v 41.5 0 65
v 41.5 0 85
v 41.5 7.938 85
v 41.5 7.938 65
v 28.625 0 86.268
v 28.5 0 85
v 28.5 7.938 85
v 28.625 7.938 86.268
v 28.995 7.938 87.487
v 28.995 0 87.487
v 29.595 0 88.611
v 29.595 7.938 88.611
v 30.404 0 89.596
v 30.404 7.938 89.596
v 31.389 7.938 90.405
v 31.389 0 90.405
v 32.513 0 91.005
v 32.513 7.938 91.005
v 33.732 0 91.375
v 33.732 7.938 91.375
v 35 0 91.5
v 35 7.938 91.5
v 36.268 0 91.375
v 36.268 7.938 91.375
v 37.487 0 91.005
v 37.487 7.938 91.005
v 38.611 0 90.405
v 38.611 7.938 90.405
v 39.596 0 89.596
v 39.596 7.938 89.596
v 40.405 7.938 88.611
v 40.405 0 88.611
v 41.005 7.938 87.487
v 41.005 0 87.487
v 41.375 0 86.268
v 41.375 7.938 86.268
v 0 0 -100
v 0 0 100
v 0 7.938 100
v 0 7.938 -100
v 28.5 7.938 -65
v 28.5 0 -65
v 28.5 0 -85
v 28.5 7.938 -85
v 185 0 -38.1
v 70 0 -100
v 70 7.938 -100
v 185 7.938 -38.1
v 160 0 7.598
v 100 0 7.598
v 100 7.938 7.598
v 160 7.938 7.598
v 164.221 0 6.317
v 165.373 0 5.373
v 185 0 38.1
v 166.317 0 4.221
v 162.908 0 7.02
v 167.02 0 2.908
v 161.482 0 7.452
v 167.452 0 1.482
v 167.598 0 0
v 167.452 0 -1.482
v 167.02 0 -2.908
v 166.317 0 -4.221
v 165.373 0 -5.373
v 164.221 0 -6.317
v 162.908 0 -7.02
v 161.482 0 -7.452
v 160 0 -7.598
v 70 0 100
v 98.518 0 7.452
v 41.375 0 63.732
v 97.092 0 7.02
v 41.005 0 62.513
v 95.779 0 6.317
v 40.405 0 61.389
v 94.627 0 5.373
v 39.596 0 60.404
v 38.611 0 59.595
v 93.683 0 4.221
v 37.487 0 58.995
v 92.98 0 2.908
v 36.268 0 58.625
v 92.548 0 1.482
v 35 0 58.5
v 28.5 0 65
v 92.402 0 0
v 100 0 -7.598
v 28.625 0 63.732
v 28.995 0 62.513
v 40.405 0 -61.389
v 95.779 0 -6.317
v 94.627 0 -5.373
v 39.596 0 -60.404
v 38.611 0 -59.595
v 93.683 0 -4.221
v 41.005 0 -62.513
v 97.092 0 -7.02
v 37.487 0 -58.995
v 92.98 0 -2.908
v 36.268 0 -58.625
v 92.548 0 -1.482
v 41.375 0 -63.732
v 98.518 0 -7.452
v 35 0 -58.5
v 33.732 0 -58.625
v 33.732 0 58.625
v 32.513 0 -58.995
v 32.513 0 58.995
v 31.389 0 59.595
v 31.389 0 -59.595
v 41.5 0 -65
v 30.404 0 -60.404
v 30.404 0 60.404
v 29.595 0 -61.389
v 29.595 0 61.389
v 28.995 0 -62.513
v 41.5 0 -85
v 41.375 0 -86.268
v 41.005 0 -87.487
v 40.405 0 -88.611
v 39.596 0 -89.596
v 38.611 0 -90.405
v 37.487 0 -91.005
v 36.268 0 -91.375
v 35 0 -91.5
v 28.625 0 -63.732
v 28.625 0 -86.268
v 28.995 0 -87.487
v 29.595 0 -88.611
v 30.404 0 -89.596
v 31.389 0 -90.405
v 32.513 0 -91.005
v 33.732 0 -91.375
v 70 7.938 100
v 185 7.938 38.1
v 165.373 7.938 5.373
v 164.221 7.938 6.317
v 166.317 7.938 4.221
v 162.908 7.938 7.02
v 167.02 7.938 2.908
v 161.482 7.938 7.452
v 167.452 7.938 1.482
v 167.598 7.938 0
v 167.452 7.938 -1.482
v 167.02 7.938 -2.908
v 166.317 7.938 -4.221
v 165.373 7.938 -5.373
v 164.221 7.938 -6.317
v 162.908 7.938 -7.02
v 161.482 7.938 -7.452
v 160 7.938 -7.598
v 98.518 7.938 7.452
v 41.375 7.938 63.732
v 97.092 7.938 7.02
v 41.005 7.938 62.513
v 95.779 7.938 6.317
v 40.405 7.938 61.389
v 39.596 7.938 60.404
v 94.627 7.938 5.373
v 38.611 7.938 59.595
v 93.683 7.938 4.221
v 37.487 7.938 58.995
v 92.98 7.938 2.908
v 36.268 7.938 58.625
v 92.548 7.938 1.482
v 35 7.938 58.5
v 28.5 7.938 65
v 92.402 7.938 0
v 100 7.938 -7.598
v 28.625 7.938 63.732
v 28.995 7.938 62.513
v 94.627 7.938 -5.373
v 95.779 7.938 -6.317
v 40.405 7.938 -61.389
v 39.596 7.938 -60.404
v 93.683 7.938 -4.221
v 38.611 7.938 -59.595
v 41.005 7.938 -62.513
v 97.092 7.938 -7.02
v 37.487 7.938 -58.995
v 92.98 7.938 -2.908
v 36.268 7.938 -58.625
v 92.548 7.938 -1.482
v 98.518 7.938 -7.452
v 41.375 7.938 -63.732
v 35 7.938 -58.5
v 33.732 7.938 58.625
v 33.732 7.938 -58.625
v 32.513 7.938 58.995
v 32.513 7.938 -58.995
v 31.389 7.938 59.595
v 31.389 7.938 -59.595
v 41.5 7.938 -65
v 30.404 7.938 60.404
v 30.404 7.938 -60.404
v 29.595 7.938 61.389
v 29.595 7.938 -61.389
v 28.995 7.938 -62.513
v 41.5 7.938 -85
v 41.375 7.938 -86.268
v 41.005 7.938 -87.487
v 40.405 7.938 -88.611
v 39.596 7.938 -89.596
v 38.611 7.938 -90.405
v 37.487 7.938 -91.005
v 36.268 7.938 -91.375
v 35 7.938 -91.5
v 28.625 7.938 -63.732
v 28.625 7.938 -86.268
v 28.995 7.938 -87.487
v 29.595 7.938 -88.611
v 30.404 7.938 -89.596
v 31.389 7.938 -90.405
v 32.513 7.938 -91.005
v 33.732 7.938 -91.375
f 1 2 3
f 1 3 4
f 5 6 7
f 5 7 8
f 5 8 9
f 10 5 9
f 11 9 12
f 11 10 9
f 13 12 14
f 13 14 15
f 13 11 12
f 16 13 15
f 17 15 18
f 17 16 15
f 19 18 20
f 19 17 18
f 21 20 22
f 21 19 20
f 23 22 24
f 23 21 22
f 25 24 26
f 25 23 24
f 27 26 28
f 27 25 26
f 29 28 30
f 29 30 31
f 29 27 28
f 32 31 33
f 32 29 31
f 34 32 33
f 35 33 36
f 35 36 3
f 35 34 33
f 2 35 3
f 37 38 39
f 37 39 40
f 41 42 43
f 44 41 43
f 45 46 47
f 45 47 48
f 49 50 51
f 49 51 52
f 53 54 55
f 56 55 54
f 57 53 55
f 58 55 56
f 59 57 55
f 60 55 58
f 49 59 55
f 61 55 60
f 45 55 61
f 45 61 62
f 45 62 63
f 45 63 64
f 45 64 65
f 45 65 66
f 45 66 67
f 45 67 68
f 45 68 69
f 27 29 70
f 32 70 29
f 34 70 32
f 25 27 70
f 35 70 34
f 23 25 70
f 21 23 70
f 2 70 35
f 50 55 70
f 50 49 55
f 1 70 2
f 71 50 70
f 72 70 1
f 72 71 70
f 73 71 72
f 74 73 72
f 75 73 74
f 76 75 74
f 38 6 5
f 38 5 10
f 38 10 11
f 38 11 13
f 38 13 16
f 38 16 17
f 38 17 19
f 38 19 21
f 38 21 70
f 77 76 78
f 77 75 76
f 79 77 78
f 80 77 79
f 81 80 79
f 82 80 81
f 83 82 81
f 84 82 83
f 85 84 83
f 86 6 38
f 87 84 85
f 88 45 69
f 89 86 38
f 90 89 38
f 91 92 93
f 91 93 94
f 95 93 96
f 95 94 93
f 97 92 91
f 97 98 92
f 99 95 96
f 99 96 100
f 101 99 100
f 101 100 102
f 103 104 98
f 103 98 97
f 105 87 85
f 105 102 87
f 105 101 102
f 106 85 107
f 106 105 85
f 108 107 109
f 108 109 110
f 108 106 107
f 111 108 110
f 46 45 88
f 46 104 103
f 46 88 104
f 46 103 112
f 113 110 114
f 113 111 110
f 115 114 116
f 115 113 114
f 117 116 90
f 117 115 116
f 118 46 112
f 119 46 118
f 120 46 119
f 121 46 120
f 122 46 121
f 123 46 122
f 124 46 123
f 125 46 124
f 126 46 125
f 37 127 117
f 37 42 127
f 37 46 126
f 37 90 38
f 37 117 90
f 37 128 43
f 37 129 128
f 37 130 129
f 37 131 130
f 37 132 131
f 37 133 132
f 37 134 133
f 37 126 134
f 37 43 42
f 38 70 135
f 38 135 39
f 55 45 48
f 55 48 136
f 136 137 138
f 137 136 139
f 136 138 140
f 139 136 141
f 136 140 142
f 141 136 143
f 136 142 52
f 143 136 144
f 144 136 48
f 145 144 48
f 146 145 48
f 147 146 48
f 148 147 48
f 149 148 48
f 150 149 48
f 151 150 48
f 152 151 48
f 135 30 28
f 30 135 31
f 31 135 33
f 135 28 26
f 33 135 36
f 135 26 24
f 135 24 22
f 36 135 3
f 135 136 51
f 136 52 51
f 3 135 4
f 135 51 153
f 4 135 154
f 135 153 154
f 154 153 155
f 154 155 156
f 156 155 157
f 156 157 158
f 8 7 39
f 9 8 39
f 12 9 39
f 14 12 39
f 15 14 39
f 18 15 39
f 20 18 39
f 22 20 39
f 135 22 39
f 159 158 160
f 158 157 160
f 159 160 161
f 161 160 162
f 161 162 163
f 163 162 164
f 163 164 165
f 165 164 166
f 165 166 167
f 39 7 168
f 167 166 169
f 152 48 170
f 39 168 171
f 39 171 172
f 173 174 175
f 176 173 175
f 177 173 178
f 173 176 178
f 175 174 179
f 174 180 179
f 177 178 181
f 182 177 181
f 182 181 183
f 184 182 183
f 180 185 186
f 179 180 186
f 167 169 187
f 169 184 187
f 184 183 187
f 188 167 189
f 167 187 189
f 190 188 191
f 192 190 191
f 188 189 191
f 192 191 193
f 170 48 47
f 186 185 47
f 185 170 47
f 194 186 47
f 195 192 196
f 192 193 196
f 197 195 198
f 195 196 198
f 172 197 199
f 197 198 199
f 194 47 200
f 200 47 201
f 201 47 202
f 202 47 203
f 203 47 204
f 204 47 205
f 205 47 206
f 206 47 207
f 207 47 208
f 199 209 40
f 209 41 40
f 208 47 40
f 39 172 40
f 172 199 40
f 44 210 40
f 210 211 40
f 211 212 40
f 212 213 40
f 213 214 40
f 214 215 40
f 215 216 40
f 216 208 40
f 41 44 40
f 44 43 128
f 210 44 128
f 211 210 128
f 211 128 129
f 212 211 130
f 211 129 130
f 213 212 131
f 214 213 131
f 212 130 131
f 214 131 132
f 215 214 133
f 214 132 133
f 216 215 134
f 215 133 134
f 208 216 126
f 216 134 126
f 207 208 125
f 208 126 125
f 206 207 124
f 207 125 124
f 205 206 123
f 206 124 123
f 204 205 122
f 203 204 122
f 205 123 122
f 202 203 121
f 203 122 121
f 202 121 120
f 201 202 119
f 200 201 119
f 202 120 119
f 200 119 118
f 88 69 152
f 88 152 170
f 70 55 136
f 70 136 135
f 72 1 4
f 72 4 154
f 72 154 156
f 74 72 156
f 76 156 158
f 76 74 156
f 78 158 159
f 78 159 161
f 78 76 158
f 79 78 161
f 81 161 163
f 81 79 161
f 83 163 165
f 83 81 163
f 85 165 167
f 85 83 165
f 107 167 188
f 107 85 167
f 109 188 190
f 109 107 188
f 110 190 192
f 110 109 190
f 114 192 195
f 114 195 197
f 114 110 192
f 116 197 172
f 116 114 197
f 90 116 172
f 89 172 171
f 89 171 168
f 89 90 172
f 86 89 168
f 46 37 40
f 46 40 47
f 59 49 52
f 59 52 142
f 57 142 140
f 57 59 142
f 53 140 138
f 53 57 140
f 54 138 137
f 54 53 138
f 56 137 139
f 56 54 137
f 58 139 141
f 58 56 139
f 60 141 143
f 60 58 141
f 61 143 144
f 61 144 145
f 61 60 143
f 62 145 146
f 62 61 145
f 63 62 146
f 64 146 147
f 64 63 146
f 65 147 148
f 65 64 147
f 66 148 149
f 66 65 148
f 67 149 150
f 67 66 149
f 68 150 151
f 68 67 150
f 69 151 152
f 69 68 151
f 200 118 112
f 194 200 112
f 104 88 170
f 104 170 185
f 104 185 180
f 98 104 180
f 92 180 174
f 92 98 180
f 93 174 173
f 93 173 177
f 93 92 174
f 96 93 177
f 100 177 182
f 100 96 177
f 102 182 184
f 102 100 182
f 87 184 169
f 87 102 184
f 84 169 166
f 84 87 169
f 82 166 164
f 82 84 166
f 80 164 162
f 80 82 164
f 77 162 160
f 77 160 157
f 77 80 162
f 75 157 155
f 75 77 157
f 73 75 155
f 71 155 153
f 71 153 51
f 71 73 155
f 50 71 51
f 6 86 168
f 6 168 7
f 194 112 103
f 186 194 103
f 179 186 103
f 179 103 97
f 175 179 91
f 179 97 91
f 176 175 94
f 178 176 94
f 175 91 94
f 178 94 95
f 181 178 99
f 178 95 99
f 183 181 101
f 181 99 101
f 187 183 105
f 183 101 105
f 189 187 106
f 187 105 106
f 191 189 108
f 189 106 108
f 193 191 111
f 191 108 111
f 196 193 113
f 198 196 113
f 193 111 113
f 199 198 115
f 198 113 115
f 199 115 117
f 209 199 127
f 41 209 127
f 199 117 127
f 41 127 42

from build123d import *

# Parameters (mm, degrees)
SALIENTE_EXTRUIR1_DEPTH = 7.9375


with BuildPart() as part:
    # Croquis1 → Saliente-Extruir1 (new body)
    with BuildSketch(Plane(origin=(0, 0, 0), x_dir=(1, 0, 0), z_dir=(0, 1, 0))):
        Polygon((70, -100), (0, -100), (0, 100), (70, 100), (185, 38.1), (185, -38.1), align=None)
        with BuildLine():
            ThreePointArc((41.5, -65), (35, -58.5), (28.5, -65))
            Line((28.5, -65), (28.5, -85))
            ThreePointArc((28.5, -85), (35, -91.5), (41.5, -85))
            Line((41.5, -85), (41.5, -65))
        make_face(mode=Mode.SUBTRACT)
        with BuildLine():
            ThreePointArc((160, -7.597922996), (167.597922996, 0), (160, 7.597922996))
            Line((160, 7.597922996), (100, 7.597922996))
            ThreePointArc((100, 7.597922996), (92.402077004, 0), (100, -7.597922996))
            Line((100, -7.597922996), (160, -7.597922996))
        make_face(mode=Mode.SUBTRACT)
        with BuildLine():
            Line((41.5, 85), (41.5, 65))
            ThreePointArc((41.5, 65), (35, 58.5), (28.5, 65))
            Line((28.5, 65), (28.5, 85))
            ThreePointArc((28.5, 85), (35, 91.5), (41.5, 85))
        make_face(mode=Mode.SUBTRACT)
    extrude(amount=SALIENTE_EXTRUIR1_DEPTH)


solid = part.part
